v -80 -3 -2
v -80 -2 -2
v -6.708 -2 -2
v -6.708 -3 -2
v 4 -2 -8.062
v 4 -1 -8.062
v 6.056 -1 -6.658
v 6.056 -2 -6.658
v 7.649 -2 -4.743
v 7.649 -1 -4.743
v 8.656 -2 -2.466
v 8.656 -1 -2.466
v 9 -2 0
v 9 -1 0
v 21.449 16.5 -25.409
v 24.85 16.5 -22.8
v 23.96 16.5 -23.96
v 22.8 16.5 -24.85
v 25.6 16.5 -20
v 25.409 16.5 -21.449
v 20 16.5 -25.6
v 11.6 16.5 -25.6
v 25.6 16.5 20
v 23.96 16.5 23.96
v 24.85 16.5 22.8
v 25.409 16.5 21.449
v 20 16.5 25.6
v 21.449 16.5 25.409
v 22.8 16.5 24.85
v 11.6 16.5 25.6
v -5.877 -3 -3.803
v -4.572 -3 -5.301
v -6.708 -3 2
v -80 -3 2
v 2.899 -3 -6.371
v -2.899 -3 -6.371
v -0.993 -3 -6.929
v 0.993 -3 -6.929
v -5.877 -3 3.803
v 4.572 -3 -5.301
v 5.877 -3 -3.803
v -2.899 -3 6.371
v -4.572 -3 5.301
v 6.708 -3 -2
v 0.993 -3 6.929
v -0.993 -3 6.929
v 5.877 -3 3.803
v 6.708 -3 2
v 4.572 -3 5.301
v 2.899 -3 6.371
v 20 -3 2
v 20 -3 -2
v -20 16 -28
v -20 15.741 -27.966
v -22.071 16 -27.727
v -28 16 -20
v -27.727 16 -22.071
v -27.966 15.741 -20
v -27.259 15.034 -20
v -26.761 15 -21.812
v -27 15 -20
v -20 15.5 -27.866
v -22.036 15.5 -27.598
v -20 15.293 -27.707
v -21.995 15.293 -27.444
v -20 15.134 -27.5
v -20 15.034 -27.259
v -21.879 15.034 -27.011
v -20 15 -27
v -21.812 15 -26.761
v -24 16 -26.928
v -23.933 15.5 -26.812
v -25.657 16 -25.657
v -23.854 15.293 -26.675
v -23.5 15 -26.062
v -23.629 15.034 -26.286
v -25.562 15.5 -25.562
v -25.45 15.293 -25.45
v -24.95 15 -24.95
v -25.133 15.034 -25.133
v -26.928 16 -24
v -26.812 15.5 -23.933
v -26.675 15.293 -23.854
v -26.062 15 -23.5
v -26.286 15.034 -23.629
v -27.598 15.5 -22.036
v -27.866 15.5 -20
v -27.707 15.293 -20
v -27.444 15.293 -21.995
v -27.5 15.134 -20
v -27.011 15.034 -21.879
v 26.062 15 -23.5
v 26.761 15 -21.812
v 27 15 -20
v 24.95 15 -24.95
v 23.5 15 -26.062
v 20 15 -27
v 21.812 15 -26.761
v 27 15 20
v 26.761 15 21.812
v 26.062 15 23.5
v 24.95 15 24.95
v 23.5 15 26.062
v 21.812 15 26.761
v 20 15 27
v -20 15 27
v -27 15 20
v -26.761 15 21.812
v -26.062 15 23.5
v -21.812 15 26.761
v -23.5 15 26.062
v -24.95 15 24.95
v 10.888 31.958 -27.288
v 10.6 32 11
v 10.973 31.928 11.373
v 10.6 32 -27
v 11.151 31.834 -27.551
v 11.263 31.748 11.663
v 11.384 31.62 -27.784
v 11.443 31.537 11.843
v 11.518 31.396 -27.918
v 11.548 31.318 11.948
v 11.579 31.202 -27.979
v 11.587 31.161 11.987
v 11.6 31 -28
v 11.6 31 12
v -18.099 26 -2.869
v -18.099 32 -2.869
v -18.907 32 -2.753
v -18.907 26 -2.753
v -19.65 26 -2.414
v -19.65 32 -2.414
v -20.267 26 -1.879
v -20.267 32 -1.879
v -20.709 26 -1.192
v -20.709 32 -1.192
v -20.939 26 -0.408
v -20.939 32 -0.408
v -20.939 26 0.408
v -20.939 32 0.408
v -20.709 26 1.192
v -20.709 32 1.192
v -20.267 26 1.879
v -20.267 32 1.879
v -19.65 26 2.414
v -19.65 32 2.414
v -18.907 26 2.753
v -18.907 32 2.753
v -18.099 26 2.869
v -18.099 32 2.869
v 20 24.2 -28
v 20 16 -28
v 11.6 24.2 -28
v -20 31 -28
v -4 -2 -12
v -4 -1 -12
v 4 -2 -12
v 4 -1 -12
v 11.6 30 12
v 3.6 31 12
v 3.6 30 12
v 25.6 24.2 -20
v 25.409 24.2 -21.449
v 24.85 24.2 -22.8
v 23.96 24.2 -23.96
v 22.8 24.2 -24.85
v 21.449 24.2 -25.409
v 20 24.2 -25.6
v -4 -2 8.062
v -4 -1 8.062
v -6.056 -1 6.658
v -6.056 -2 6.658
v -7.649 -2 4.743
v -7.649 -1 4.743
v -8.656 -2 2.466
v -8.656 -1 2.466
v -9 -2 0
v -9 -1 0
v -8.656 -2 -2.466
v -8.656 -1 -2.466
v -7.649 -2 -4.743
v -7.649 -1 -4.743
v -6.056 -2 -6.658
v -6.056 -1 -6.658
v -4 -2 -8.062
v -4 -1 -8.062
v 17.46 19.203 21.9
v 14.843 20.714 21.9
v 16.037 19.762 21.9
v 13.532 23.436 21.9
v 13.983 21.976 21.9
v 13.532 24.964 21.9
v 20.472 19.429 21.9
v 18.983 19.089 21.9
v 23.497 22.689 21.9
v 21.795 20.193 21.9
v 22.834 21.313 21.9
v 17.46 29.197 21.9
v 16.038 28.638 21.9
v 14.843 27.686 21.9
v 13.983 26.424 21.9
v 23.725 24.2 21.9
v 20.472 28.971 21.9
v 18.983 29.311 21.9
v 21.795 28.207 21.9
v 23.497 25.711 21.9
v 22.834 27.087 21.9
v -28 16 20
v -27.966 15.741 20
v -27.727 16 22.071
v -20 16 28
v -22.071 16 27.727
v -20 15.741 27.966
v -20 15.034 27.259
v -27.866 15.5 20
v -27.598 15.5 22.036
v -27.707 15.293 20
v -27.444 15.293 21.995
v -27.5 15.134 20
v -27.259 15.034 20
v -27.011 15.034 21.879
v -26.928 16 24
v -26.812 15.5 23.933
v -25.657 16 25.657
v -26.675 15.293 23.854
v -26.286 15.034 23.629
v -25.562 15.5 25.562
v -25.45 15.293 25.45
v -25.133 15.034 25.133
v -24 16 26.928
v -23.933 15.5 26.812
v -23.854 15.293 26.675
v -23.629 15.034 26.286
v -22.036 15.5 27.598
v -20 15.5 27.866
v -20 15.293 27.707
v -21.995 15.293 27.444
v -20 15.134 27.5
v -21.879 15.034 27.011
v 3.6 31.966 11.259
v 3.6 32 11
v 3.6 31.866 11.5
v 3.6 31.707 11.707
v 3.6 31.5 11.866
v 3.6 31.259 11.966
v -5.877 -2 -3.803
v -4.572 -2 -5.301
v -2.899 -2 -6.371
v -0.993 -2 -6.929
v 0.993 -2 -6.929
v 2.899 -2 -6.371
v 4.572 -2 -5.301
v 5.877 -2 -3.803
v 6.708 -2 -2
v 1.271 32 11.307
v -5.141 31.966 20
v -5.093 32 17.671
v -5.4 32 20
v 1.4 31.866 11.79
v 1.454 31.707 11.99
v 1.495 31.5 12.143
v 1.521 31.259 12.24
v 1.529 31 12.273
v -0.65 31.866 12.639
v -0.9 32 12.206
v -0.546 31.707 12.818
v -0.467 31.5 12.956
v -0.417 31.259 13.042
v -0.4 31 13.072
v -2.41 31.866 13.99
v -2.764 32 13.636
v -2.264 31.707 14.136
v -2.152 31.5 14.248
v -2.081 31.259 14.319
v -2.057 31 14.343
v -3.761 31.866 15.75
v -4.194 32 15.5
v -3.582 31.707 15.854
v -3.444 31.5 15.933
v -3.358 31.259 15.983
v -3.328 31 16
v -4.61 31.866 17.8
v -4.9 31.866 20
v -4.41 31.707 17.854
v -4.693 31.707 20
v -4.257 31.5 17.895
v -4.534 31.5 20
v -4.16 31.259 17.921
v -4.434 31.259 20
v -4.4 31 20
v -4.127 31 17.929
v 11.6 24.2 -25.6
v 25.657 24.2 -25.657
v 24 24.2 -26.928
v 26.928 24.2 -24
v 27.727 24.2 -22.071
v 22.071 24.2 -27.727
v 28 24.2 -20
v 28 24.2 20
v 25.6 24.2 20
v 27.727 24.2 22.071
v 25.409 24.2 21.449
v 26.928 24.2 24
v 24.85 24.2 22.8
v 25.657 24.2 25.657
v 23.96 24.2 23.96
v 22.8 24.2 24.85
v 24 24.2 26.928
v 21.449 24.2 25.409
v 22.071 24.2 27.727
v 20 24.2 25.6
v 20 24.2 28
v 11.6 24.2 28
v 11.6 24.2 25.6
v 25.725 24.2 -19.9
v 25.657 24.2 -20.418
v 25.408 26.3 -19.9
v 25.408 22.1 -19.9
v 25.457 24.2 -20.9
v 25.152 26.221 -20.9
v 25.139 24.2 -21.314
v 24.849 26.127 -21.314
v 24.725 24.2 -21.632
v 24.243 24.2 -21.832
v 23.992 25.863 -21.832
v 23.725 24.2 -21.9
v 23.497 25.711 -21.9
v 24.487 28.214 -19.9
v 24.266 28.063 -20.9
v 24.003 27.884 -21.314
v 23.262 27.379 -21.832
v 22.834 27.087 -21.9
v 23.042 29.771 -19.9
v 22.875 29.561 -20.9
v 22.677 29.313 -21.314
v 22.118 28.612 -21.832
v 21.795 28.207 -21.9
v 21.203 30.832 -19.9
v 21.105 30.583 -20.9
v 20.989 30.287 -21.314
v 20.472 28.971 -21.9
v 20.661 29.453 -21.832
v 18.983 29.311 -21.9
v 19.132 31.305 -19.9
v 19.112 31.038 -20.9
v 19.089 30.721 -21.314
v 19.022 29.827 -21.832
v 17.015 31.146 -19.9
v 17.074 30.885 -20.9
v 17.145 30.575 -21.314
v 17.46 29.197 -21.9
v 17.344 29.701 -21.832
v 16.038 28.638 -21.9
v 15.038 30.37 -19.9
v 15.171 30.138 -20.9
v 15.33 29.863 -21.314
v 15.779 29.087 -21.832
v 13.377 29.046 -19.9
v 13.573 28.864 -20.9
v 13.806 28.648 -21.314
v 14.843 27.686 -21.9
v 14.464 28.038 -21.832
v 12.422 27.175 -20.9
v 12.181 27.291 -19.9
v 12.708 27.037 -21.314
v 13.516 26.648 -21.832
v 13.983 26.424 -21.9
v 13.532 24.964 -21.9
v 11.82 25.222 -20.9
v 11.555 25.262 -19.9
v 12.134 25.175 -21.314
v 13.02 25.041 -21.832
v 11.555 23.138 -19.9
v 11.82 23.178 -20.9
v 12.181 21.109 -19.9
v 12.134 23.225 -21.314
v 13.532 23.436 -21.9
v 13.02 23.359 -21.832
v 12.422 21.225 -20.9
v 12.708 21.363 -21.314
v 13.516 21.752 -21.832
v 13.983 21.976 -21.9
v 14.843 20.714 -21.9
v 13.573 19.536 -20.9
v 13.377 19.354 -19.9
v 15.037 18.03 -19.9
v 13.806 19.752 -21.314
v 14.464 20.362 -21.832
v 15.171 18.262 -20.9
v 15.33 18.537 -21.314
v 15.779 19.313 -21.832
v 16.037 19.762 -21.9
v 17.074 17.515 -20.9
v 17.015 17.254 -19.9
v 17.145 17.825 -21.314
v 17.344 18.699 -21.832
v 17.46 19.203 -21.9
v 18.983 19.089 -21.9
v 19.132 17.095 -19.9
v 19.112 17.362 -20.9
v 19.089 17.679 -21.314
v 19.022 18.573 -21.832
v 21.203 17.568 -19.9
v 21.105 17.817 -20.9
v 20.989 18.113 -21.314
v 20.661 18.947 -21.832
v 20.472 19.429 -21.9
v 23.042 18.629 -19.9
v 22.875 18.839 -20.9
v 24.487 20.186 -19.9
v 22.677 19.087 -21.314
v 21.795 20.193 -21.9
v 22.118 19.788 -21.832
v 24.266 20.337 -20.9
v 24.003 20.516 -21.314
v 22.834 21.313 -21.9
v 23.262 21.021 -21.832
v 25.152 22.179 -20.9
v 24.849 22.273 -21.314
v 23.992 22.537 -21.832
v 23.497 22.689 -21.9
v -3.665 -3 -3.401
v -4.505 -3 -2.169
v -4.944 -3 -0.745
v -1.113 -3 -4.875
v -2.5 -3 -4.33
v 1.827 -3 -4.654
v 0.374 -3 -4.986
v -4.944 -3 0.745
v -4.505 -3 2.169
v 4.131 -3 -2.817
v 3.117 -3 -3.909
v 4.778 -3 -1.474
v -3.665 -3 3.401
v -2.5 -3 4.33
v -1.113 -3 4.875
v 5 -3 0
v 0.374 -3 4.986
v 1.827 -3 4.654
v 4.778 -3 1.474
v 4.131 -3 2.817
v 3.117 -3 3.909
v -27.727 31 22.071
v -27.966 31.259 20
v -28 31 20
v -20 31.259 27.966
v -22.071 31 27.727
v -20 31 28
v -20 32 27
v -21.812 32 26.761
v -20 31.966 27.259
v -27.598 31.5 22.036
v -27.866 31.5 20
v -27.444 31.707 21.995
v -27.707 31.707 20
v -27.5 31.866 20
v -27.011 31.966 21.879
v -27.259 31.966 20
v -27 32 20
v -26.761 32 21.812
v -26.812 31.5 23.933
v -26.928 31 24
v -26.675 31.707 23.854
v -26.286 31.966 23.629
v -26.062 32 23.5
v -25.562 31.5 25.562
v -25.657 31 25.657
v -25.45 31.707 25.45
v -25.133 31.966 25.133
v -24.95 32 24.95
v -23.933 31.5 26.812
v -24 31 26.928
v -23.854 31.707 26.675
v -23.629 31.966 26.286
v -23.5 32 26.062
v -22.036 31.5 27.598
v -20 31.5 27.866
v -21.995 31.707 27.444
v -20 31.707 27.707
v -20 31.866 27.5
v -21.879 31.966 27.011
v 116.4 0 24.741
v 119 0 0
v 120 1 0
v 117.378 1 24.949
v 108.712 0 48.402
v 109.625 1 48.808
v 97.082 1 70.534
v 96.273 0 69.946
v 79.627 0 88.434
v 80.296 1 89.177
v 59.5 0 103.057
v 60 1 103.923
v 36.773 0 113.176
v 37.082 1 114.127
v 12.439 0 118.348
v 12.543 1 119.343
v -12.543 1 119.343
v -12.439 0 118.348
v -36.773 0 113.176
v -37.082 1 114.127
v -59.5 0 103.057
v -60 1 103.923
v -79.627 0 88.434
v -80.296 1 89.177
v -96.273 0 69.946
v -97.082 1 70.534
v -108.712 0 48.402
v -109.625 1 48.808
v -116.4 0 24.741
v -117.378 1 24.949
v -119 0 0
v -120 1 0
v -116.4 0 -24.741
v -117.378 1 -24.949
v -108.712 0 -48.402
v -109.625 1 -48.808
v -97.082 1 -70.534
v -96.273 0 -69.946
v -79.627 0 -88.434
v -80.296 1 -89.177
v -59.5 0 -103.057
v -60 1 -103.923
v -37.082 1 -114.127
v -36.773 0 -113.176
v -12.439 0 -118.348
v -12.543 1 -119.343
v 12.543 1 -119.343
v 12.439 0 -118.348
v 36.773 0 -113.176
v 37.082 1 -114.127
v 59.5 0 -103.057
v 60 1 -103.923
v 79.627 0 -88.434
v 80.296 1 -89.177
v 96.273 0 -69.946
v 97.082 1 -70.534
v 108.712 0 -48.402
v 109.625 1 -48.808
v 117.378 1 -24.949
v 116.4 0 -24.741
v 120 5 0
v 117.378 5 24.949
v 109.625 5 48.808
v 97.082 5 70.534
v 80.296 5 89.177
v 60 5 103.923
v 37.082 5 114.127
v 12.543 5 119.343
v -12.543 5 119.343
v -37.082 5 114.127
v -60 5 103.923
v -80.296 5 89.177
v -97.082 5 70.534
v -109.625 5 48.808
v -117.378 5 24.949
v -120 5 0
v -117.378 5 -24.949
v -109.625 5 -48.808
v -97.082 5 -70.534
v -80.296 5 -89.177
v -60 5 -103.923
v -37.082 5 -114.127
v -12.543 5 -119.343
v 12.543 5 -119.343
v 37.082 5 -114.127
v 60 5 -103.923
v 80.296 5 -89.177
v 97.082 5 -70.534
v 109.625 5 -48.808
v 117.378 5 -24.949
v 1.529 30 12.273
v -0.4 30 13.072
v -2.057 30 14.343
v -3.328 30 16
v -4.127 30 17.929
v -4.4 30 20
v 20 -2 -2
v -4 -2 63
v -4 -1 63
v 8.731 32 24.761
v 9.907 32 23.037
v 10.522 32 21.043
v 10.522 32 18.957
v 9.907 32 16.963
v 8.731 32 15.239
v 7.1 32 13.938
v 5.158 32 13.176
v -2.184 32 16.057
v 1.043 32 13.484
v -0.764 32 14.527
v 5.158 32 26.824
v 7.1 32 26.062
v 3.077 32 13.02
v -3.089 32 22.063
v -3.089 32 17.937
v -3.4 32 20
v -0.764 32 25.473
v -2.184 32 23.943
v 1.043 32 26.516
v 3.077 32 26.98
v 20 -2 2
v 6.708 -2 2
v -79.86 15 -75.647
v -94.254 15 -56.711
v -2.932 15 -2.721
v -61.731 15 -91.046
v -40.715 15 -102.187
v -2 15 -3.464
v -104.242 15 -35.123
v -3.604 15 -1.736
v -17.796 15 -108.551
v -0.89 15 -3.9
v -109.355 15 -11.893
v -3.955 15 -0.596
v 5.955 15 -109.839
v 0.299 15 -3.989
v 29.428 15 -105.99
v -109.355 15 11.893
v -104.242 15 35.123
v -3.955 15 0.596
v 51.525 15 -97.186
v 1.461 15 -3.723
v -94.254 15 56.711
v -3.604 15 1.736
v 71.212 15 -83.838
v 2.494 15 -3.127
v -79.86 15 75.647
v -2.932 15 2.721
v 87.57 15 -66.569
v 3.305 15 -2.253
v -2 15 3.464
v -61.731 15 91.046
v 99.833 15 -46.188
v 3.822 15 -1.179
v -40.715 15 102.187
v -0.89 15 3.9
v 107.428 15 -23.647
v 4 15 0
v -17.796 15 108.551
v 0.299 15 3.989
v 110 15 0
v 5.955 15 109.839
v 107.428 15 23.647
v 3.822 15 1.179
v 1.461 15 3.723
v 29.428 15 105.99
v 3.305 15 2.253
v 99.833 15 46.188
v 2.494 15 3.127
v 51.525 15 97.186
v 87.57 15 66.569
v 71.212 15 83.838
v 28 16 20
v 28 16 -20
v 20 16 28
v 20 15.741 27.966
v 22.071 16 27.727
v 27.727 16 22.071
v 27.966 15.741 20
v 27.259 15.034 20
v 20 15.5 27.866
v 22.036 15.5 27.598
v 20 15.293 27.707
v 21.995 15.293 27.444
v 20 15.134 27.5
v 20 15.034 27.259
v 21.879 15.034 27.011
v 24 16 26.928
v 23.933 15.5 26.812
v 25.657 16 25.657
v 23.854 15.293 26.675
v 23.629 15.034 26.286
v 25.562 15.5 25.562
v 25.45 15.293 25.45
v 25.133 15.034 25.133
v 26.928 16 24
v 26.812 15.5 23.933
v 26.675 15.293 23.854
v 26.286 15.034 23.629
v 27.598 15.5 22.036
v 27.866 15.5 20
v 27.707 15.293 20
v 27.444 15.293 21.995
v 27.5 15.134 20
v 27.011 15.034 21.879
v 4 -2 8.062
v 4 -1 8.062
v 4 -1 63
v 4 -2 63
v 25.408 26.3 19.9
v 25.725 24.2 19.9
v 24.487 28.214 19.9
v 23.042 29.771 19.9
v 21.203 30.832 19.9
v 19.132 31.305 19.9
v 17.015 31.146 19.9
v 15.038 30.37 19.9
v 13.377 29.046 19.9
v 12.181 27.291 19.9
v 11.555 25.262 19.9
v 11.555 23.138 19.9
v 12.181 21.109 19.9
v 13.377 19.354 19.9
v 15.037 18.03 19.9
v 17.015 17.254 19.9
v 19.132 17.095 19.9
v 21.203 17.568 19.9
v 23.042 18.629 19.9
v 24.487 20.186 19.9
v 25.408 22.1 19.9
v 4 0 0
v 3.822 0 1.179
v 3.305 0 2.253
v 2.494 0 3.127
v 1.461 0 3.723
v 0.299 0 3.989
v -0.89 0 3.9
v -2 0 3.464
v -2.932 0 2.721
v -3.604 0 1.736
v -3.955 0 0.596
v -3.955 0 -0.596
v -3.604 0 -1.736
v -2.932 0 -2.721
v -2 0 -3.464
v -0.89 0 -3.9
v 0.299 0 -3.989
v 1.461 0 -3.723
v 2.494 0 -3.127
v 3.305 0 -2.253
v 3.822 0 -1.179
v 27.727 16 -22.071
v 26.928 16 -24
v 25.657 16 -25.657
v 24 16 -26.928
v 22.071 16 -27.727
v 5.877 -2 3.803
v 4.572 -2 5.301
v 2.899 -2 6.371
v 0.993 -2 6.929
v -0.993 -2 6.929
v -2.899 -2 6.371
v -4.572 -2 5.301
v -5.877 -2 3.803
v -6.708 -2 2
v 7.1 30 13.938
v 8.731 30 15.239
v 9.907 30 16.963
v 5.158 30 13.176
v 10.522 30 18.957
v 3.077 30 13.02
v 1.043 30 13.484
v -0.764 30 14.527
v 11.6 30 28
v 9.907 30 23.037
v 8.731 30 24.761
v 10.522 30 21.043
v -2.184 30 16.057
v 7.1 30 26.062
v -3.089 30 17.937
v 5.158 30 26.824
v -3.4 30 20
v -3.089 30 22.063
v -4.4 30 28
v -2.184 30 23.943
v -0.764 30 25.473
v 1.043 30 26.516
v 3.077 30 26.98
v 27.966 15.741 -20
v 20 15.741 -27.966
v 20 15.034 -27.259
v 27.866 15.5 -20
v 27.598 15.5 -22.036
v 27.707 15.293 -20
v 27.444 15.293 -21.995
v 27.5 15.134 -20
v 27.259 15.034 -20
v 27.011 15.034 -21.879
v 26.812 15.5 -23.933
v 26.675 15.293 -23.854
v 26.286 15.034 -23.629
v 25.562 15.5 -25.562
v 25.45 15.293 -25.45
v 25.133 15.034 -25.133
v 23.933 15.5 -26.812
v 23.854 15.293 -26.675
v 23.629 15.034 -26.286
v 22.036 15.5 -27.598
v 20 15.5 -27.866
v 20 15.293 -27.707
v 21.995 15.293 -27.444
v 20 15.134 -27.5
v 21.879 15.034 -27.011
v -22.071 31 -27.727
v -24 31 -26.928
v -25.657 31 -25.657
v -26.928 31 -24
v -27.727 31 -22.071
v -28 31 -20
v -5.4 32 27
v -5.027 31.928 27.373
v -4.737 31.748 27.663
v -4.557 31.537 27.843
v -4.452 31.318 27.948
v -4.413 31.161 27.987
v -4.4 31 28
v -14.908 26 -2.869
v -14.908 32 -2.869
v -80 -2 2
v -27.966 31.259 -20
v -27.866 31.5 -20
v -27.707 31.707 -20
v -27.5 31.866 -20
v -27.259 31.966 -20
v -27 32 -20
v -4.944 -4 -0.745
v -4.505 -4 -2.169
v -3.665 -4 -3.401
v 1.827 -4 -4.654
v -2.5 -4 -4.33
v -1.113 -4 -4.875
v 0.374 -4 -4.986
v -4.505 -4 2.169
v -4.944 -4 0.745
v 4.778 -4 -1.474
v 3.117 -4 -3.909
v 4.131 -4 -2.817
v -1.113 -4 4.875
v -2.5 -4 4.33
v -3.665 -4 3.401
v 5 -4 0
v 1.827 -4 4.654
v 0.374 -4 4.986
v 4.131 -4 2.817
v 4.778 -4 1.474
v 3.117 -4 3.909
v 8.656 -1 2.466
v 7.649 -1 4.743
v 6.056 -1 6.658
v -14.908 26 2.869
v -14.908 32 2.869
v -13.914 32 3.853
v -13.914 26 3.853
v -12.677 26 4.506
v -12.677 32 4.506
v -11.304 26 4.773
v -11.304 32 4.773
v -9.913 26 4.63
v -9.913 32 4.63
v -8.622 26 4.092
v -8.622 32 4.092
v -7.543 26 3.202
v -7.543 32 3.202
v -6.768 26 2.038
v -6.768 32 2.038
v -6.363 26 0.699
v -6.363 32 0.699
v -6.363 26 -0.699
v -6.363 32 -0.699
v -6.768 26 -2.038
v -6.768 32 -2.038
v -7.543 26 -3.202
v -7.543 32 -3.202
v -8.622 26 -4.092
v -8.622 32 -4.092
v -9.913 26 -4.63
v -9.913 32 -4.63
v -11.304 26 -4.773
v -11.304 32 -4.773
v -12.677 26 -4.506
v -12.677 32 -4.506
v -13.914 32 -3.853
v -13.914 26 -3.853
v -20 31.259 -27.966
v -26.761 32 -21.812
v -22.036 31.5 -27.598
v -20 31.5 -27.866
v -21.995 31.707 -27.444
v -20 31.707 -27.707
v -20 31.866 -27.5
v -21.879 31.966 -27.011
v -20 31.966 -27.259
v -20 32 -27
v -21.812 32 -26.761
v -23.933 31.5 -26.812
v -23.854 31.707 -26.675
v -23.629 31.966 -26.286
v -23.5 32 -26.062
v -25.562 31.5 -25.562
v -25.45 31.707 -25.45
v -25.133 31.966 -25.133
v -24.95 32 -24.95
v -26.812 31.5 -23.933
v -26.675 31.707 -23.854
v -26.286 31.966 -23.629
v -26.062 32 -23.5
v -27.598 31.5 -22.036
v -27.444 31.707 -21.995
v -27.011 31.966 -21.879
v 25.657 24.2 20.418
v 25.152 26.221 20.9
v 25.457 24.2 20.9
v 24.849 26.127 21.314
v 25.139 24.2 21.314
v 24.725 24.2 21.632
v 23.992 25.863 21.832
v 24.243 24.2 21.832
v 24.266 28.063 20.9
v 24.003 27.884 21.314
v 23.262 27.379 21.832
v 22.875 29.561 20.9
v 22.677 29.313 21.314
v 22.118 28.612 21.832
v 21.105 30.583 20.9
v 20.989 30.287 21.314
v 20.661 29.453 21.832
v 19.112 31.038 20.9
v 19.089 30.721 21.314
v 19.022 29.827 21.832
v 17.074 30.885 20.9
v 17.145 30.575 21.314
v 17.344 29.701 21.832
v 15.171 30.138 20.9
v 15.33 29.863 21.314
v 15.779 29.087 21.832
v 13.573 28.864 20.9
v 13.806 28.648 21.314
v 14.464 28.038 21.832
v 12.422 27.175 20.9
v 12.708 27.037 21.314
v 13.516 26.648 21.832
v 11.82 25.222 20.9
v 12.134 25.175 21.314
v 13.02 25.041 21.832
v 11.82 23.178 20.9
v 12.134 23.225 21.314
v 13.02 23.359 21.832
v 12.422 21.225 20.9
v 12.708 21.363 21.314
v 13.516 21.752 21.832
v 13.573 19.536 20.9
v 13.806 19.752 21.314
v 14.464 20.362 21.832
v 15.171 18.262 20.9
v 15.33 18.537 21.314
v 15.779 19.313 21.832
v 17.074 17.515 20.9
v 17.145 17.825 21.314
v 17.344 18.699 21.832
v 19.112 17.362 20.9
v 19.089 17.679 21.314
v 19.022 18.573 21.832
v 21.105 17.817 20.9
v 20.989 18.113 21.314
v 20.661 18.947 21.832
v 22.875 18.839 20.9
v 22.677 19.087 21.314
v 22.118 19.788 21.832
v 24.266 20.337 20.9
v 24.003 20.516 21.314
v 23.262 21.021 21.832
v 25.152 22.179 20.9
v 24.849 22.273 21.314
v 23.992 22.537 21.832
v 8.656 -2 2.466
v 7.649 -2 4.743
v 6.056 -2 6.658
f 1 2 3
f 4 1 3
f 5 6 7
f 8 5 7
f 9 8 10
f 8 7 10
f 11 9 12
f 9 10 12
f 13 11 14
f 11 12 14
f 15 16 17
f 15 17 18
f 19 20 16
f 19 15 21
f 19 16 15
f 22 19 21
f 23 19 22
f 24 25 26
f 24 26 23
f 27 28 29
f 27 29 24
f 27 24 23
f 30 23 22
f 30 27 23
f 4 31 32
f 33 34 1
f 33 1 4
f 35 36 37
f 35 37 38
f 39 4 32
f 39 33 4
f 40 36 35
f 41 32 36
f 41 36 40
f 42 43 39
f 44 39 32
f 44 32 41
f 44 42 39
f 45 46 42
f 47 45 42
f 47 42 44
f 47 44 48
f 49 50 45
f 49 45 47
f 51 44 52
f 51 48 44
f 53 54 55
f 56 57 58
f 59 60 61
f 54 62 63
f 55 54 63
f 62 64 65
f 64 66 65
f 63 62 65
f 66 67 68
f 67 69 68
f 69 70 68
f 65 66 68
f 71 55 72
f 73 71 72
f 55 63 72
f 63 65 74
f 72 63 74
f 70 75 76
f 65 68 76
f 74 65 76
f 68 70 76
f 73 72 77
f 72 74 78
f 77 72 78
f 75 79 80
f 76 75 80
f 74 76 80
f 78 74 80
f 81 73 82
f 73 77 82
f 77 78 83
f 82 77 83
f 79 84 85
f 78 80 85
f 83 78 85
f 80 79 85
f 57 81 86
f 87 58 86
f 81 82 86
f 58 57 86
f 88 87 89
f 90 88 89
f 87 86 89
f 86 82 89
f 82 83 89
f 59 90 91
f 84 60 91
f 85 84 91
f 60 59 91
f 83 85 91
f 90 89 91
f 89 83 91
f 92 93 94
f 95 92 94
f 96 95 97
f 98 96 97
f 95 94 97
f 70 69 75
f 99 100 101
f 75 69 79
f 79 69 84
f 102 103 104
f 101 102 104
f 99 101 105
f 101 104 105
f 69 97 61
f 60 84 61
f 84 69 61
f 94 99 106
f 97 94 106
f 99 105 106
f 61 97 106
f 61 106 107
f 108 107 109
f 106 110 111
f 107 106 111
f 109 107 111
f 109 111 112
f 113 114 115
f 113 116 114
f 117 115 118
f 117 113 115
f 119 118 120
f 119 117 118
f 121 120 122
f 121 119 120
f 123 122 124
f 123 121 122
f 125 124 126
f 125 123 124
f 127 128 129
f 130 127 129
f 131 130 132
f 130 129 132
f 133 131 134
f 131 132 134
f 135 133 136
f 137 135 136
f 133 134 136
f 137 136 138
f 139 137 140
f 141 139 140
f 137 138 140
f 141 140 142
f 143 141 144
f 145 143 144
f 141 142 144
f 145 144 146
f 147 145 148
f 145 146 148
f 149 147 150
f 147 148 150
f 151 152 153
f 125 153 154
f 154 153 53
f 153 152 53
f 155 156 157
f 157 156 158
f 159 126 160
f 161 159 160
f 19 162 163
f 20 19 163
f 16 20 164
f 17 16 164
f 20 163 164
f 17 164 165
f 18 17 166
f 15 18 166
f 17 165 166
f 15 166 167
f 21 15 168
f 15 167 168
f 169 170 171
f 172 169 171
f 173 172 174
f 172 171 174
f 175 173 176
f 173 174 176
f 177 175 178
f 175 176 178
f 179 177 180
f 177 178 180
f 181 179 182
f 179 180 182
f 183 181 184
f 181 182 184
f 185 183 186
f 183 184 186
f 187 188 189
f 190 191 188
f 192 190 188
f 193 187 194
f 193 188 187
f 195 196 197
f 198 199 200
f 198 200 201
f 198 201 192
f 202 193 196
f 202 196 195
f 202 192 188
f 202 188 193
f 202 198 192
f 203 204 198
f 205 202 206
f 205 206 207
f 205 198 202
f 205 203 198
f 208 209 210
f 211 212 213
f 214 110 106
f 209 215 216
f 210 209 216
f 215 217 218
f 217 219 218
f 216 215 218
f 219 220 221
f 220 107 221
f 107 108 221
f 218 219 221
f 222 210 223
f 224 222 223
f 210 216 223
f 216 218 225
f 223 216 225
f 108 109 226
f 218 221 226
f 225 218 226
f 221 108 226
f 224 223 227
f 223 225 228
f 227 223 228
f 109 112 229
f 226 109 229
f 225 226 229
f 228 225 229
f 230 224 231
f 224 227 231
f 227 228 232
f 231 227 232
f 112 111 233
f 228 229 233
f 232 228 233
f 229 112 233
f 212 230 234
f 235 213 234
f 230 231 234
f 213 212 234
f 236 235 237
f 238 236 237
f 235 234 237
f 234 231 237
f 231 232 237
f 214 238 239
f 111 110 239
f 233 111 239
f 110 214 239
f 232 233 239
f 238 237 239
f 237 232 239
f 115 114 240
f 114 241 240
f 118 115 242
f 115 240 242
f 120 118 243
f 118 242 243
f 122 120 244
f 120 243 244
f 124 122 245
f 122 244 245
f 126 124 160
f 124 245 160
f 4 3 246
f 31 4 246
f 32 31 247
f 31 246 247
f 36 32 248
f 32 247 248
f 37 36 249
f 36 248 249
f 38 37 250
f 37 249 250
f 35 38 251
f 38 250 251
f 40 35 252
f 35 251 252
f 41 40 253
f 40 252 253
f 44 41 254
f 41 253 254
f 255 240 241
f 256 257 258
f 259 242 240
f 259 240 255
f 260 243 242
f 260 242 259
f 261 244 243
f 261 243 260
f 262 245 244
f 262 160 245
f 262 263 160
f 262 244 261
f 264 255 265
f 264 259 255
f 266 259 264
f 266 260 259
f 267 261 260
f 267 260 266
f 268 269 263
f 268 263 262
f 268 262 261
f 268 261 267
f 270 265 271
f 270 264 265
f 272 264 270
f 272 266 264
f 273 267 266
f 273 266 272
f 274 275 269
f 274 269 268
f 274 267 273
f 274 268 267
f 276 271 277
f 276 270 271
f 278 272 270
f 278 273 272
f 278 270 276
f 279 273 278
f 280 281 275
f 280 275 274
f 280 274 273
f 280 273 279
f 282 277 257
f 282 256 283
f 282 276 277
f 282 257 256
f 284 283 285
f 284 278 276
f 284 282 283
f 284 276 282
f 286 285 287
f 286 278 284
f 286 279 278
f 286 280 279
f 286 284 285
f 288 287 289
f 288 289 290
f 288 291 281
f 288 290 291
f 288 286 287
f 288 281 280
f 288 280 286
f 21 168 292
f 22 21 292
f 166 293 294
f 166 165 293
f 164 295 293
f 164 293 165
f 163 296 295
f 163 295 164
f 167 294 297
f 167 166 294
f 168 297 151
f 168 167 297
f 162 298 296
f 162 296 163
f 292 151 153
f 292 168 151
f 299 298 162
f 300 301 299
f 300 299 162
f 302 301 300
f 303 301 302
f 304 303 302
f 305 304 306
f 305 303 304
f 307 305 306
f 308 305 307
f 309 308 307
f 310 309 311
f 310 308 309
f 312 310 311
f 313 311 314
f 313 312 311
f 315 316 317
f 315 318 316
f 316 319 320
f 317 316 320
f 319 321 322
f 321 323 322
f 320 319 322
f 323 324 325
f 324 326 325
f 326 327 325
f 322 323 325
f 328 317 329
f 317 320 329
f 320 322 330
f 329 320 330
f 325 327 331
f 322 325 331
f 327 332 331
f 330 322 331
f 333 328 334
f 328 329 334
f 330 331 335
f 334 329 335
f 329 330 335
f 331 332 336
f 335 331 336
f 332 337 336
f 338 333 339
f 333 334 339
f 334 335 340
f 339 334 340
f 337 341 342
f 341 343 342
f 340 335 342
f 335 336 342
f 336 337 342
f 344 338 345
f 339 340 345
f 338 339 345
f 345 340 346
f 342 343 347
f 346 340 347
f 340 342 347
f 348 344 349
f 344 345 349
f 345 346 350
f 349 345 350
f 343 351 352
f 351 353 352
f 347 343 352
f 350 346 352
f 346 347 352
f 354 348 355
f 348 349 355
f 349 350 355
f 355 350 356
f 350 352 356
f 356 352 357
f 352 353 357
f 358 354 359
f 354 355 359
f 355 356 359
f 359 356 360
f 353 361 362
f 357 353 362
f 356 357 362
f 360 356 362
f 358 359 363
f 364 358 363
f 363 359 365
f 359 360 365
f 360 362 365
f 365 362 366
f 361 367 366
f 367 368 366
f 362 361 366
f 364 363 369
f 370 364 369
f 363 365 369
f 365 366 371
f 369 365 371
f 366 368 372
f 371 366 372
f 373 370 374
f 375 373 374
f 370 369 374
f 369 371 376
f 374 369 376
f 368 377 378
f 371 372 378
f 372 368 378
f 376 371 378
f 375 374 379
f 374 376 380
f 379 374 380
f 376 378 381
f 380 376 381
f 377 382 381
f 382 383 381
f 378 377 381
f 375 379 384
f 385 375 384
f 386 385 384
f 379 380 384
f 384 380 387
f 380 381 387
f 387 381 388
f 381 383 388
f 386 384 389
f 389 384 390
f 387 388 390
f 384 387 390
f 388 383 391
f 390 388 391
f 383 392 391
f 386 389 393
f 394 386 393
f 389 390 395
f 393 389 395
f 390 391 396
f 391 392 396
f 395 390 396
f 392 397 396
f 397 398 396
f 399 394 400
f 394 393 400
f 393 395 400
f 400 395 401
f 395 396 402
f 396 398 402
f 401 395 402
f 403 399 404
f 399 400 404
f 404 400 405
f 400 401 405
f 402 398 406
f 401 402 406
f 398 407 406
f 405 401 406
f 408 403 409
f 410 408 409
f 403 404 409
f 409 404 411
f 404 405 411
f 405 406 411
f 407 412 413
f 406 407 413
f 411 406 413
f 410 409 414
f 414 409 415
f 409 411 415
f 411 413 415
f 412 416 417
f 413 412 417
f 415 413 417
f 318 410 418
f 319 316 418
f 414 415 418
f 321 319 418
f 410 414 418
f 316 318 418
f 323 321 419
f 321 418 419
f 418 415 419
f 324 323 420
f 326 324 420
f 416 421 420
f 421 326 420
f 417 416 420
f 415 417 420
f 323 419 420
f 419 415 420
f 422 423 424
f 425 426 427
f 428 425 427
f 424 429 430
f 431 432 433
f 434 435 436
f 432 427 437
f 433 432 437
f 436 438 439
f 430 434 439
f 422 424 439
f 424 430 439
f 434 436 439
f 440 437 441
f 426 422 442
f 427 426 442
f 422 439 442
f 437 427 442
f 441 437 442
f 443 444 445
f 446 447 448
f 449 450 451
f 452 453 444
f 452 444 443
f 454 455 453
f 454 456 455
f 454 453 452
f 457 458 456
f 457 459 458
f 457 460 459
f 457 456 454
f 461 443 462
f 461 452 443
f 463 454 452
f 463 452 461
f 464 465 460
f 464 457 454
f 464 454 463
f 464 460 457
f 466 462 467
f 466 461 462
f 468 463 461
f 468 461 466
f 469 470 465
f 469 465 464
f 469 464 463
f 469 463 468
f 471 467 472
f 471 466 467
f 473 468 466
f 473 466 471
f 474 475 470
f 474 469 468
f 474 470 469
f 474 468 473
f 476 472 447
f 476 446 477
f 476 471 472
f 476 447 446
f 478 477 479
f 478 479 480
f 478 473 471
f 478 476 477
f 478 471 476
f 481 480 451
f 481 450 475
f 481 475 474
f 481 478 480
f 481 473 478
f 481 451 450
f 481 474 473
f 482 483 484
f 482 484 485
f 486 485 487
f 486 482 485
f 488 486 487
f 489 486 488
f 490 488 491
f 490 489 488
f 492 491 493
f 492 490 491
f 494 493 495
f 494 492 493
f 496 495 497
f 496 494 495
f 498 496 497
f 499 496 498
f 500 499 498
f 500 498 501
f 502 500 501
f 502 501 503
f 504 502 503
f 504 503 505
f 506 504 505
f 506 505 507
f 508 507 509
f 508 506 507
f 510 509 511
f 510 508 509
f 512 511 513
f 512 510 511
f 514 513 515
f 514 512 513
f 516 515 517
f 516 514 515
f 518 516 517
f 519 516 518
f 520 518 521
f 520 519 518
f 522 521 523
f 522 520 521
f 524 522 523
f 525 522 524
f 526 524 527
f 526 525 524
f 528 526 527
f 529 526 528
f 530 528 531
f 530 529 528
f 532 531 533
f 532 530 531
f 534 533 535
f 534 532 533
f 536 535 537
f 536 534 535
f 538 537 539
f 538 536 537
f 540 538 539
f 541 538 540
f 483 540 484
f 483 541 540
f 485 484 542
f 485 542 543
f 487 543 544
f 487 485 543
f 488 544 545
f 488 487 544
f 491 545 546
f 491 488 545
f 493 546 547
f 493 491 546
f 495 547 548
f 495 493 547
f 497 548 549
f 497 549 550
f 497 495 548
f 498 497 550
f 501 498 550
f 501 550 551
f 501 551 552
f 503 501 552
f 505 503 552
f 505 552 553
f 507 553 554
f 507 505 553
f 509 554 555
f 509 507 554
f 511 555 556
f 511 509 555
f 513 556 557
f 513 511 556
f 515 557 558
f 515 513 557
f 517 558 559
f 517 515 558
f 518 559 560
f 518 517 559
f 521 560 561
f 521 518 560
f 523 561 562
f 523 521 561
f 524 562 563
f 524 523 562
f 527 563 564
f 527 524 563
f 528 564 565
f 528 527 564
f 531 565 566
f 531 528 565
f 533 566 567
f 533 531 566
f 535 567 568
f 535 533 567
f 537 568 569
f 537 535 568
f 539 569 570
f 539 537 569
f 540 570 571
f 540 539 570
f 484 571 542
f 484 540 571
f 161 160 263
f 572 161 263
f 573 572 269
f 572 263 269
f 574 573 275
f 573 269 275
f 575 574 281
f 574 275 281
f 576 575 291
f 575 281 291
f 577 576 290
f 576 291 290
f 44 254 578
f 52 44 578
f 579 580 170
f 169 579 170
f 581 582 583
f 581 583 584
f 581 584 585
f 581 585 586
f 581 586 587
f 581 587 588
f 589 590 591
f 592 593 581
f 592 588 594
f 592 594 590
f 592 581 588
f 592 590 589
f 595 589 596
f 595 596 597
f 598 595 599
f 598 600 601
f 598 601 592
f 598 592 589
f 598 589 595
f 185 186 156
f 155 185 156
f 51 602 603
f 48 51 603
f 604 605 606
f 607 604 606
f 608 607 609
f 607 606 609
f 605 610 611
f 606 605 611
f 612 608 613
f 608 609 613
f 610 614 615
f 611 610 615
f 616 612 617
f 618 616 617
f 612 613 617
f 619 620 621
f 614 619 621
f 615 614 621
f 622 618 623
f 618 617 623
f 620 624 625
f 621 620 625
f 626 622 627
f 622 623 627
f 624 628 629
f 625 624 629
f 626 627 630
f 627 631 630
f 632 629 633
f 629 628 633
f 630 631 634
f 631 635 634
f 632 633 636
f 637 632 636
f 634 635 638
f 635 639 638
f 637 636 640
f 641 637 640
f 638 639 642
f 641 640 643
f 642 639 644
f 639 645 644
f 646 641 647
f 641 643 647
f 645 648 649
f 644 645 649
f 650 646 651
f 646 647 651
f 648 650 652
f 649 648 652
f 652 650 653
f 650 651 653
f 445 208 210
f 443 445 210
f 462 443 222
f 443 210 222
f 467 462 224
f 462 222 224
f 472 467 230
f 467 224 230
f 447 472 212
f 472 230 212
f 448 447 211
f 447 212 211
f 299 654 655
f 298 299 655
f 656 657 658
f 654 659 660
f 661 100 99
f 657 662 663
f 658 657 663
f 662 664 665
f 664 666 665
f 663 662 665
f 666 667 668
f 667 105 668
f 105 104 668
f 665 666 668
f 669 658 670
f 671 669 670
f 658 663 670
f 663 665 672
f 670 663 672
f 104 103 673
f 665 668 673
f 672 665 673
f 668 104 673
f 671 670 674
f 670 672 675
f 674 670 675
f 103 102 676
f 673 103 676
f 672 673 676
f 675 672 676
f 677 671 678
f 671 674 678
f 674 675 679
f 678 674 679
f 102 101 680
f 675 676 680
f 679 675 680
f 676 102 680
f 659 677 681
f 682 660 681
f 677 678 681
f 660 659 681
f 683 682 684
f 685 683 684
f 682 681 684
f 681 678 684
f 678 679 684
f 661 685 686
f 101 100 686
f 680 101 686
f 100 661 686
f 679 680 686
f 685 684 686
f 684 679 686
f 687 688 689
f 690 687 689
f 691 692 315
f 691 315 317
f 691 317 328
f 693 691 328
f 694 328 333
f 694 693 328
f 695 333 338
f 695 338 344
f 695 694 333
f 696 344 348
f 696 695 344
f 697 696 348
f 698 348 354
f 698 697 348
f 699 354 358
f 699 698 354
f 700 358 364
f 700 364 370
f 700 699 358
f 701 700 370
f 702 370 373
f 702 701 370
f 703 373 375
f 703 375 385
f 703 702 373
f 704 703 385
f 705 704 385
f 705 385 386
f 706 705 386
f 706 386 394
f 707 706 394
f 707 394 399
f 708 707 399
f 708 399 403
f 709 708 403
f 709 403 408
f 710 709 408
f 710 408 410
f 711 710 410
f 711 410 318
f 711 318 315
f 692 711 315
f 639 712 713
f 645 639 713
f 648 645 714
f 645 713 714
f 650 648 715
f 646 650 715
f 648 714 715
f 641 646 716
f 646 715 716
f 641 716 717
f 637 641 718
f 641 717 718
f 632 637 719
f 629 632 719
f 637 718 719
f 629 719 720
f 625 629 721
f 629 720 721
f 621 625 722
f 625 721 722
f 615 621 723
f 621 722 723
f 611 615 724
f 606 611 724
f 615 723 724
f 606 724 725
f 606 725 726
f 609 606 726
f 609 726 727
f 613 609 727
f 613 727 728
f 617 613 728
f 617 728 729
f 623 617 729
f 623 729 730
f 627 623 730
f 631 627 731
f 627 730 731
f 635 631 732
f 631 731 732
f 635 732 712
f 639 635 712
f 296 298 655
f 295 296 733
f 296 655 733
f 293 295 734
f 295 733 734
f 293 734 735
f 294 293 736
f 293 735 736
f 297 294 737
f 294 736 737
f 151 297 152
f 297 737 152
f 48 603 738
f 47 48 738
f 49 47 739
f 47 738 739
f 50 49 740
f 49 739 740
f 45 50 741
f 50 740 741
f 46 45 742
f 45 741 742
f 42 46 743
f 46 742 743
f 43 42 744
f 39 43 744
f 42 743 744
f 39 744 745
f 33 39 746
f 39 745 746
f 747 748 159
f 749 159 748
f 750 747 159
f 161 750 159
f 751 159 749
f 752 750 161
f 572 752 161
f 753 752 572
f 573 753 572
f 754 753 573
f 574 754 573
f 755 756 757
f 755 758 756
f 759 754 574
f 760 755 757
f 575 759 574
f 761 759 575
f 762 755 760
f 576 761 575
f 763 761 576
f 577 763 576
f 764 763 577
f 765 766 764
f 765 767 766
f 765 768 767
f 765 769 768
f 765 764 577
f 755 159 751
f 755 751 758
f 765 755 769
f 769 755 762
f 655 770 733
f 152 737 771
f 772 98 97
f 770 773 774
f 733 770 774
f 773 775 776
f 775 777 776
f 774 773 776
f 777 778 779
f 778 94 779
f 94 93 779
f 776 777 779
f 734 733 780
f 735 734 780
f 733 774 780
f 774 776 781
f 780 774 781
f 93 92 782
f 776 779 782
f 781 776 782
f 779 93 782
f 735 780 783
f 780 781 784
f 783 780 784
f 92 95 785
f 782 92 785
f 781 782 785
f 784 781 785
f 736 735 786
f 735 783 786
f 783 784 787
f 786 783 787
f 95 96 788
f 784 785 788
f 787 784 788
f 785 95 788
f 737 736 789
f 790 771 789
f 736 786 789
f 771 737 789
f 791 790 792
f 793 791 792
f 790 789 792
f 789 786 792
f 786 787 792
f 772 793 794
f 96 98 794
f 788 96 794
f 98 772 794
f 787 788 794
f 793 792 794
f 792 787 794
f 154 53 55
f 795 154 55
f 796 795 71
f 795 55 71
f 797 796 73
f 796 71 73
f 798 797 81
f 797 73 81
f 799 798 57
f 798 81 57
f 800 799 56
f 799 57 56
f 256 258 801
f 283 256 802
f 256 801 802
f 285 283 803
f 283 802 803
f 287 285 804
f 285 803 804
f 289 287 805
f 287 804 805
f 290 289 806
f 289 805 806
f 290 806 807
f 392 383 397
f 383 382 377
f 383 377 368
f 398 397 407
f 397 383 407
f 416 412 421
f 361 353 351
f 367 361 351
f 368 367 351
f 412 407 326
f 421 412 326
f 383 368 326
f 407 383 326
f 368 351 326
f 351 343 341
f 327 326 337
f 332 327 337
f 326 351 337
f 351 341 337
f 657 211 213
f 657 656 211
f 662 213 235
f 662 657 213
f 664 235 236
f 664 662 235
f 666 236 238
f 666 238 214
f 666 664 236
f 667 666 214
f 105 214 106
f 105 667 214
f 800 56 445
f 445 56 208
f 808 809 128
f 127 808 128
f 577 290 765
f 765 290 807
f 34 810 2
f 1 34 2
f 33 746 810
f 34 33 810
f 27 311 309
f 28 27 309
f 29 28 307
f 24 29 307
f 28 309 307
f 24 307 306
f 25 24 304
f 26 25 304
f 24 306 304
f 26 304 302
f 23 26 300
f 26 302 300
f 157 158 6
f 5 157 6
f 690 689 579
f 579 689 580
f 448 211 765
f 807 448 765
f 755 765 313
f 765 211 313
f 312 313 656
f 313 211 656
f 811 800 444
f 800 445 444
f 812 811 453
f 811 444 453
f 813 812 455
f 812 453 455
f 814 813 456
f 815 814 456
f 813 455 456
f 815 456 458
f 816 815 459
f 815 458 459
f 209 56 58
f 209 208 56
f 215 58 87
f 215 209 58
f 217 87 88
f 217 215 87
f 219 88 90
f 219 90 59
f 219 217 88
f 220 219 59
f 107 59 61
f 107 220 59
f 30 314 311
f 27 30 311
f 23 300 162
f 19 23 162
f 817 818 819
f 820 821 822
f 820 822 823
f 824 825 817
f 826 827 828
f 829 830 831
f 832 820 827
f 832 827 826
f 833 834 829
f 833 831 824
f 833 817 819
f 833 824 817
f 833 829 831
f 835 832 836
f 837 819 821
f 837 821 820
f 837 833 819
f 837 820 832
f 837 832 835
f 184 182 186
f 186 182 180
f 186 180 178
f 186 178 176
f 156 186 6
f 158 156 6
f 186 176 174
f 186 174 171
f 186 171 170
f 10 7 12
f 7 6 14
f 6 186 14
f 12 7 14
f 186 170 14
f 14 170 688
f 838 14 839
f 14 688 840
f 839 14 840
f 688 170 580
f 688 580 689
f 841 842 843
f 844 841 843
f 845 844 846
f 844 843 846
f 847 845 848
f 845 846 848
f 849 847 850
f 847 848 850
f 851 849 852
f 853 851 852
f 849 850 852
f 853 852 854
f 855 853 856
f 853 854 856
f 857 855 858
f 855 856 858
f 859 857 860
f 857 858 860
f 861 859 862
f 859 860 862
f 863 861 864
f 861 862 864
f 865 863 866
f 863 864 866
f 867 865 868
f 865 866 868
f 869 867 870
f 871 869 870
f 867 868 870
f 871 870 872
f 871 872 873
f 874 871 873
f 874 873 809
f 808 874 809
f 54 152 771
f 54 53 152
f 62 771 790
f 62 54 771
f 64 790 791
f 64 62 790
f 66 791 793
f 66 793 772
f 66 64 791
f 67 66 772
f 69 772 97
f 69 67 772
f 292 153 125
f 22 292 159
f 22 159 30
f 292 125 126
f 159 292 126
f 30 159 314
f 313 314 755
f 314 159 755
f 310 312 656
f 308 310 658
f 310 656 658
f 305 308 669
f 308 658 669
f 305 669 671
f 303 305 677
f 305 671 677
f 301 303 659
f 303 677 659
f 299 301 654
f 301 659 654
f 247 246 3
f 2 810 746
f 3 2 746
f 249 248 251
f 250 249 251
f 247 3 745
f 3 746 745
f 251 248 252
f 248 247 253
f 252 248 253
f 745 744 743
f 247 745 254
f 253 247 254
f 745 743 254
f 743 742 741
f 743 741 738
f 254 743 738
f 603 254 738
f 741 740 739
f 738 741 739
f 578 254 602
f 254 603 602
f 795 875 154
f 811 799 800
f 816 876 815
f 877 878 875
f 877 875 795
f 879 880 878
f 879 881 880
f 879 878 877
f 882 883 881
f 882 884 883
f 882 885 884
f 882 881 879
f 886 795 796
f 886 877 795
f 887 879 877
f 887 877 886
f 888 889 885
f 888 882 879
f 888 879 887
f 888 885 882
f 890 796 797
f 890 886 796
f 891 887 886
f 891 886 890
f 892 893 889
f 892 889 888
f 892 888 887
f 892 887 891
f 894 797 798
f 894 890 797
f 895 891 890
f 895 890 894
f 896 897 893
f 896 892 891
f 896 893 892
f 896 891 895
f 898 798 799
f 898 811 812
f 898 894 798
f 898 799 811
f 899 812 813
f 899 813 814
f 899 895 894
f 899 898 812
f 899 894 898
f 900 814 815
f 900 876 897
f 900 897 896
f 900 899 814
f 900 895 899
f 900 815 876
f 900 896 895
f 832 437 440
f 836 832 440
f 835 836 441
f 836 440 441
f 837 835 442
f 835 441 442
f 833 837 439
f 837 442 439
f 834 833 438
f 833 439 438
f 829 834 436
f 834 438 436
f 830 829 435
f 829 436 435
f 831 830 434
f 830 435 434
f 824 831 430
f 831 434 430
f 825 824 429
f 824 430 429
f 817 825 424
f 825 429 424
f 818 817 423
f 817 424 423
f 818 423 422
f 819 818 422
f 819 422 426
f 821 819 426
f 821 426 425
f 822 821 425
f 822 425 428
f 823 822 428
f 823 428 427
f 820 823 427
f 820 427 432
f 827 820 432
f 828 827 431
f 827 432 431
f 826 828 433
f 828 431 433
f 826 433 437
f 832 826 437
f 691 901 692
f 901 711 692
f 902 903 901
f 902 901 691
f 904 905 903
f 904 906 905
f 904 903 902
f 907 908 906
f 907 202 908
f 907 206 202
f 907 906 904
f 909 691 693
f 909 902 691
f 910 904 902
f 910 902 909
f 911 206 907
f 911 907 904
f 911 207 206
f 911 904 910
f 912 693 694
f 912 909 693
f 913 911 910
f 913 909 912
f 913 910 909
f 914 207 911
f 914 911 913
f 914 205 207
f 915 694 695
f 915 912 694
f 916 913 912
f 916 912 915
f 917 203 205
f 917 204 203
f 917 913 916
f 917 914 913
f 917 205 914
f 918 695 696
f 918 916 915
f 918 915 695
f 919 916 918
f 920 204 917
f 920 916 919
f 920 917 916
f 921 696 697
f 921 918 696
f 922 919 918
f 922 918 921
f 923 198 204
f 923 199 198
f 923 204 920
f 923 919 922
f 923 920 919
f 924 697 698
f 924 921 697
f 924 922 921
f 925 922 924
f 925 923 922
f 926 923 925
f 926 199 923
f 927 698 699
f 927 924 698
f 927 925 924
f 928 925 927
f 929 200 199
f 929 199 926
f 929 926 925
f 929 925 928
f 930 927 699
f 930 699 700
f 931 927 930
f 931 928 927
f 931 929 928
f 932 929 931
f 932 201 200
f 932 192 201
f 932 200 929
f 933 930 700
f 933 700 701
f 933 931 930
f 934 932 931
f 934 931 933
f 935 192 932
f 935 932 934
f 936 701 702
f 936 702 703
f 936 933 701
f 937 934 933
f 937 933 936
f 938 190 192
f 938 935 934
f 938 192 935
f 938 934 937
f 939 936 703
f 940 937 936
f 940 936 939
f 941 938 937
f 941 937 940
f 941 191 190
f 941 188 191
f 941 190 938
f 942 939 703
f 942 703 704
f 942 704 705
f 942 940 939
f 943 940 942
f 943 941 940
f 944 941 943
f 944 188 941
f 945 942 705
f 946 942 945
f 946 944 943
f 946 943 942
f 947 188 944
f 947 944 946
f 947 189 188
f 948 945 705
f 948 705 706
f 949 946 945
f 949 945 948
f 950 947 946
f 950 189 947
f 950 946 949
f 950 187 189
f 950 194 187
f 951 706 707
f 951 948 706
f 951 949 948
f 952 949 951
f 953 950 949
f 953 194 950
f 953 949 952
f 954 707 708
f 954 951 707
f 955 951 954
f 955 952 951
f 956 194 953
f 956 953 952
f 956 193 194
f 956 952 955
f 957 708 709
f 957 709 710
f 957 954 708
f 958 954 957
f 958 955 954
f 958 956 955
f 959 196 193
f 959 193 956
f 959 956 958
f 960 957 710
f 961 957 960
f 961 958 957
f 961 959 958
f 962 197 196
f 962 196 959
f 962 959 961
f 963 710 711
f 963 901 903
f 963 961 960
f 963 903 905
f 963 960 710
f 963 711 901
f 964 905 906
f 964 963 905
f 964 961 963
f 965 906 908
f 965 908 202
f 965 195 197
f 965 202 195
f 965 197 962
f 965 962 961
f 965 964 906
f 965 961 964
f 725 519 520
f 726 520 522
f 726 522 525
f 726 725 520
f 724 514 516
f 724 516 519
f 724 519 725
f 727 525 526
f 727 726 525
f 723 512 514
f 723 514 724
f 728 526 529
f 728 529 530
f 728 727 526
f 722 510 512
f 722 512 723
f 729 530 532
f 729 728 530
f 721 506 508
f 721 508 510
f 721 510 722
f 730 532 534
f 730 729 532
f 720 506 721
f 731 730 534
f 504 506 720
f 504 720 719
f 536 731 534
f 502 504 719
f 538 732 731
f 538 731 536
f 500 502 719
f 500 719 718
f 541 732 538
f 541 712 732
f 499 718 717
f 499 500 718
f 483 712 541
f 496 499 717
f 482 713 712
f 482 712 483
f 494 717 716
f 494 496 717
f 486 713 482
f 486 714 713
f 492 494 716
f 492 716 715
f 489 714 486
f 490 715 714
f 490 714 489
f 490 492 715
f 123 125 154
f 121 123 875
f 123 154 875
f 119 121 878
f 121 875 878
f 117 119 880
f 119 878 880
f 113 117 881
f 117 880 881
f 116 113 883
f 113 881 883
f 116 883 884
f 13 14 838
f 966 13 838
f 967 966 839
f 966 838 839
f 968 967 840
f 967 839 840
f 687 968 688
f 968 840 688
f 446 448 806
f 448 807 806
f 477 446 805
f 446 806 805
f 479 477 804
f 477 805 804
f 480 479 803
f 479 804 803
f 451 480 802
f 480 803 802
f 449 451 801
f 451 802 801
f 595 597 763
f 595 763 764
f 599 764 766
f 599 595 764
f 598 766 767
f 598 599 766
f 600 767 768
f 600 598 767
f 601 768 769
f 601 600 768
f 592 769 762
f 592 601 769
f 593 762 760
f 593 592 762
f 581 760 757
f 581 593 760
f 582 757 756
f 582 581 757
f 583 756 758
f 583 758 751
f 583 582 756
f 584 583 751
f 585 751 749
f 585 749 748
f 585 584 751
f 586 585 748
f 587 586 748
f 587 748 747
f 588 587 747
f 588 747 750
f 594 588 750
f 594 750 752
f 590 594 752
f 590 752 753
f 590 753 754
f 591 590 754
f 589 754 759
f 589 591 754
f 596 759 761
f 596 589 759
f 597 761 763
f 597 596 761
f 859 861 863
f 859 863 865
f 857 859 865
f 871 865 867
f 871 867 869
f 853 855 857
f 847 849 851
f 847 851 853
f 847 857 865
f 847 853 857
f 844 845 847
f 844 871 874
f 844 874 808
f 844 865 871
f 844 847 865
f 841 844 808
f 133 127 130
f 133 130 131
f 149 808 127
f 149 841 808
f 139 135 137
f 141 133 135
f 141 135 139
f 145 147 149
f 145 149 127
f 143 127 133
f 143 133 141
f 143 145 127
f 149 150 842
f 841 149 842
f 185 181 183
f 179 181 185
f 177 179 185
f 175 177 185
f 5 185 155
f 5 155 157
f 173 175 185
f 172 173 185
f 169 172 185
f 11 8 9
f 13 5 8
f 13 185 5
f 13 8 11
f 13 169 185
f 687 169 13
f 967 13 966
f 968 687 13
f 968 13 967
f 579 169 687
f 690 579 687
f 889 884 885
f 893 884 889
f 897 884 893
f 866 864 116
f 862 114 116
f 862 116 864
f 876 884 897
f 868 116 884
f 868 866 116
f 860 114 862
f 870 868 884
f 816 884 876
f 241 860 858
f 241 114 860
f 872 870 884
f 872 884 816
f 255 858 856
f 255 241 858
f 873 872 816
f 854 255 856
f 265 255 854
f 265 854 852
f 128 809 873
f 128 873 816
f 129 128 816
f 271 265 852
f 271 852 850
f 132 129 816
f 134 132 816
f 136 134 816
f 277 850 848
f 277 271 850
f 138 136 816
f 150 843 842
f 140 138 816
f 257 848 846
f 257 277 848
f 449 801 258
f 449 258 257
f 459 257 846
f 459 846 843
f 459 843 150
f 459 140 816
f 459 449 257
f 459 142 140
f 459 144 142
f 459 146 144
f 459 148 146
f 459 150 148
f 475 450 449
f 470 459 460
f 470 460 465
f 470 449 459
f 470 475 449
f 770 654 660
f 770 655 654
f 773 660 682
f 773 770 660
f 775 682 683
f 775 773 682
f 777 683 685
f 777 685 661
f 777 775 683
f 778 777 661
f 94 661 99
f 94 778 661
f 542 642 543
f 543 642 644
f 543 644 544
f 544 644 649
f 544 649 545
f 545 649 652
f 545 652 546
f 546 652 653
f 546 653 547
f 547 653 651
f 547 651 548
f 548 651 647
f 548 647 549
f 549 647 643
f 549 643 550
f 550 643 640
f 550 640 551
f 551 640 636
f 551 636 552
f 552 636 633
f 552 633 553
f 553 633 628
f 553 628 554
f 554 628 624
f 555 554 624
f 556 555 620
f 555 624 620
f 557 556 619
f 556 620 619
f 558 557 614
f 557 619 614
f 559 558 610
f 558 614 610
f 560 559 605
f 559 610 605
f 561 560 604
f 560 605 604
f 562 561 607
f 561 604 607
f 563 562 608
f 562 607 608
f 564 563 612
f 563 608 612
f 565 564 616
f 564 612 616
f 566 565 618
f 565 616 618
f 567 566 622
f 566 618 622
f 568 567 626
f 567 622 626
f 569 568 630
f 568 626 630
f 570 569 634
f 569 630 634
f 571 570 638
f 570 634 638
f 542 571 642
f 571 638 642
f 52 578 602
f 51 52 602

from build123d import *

# Parameters (mm, degrees)
F0_R      = 120
F1_DEPTH  = 15
F2_R      = 2.5
F3_DEPTH  = 15
F5_DEPTH  = 17
F7_DEPTH  = 15.5
F8_W      = 16.4
F8_H      = 56
F9_DEPTH  = 7.8
F10_R     = 7
F11_DEPTH = 2
F12_R     = 1
F13_R     = 7.125
F14_DEPTH = 21.9
F15_R     = 2
F16_R     = 4
F17_DEPTH = 15
F19_START = 1
F19_DEPTH = 1
F21_DEPTH = 1
F22_R     = 5
F23_DEPTH = 1
F24_SIZE  = 1
F25_SIZE  = 10
F27_DEPTH = 6


with BuildPart() as f1:
    # F0 (on Front) → F1 (new body)
    with BuildSketch(Plane.XZ):
        Circle(F0_R)
    extrude(amount=-F1_DEPTH)

    # F2 (on face) → F3 (cut, through all)
    with BuildSketch(Plane(origin=(0, 15, 0), x_dir=(-1, 0, 0), z_dir=(0, 1, 0))):
        Circle(F2_R)
    extrude(amount=-F3_DEPTH, mode=Mode.SUBTRACT)

    # F16 (on face) → F17 (cut, through all)
    with BuildSketch(Plane.XZ):
        Circle(F16_R)
    extrude(amount=-F17_DEPTH, mode=Mode.SUBTRACT)

    # F24
    f24_edges = [f1.edges().sort_by_distance(p)[0] for p in [
        (-120, 0, 0),
    ]]
    chamfer(f24_edges, length=F24_SIZE)

    # F25
    f25_edges = [f1.edges().sort_by_distance(p)[0] for p in [
        (-120, 15, 0),
    ]]
    chamfer(f25_edges, length=F25_SIZE)


with BuildPart() as f5:
    # F4 (on face) → F5 (new body)
    with BuildSketch(Plane(origin=(0, 15, 0), x_dir=(-1, 0, 0), z_dir=(0, 1, 0))):
        with BuildLine():
            ThreePointArc((-28, -20), (-25.6568542495, -25.6568542495), (-20, -28))
            Line((-20, -28), (20, -28))
            ThreePointArc((20, -28), (25.6568542495, -25.6568542495), (28, -20))
            Line((28, -20), (28, 20))
            ThreePointArc((28, 20), (25.6568542495, 25.6568542495), (20, 28))
            Line((20, 28), (-20, 28))
            ThreePointArc((-20, 28), (-25.6568542495, 25.6568542495), (-28, 20))
            Line((-28, 20), (-28, -20))
        make_face()
    extrude(amount=F5_DEPTH)

    # F6 (on face) → F7 (cut)
    with BuildSketch(Plane(origin=(0, 32, 0), x_dir=(-1, 0, 0), z_dir=(0, 1, 0))):
        with BuildLine():
            Line((-25.6, 20), (-25.6, -20))
            ThreePointArc((-25.6, -20), (-23.9597979746, -23.9597979746), (-20, -25.6))
            Line((-20, -25.6), (-11.6, -25.6))
            Line((-11.6, -25.6), (-11.6, 25.6))
            Line((-11.6, 25.6), (-20, 25.6))
            ThreePointArc((-20, 25.6), (-23.9597979746, 23.9597979746), (-25.6, 20))
        make_face()
    extrude(amount=-F7_DEPTH, mode=Mode.SUBTRACT)

    # F8 (on face) → F9 (cut)
    with BuildSketch(Plane(origin=(0, 32, 0), x_dir=(-1, 0, 0), z_dir=(0, 1, 0))):
        with Locations((-19.8, 0)):
            Rectangle(F8_W, F8_H)
    extrude(amount=-F9_DEPTH, mode=Mode.SUBTRACT)

    # F10 (on face) → F11 (cut)
    with BuildSketch(Plane(origin=(0, 32, 0), x_dir=(-1, 0, 0), z_dir=(0, 1, 0))):
        with BuildLine():
            Line((-11.6, 28), (-11.6, 12))
            Line((-11.6, 12), (-3.6, 12))
            ThreePointArc((-3.6, 12), (2.0568542495, 14.3431457505), (4.4, 20))
            Line((4.4, 20), (4.4, 28))
            Line((4.4, 28), (-11.6, 28))
        make_face()
        with Locations((-3.6, 20)):
            Circle(F10_R, mode=Mode.SUBTRACT)
    extrude(amount=-F11_DEPTH, mode=Mode.SUBTRACT)

    # F12
    f12_edges = [f5.edges().sort_by_distance(p)[0] for p in [
        (7.6, 32, 12),
        (-2.056854, 32, 14.343146),
        (-4.4, 32, 24),
        (-12.2, 32, 28),
        (-25.656854, 32, 25.656854),
        (-28, 32, 0),
        (-25.656854, 32, -25.656854),
        (-4.2, 32, -28),
        (11.6, 32, -8),
        (25.656854, 15, -25.656854),
        (0, 15, -28),
        (-25.656854, 15, -25.656854),
        (-28, 15, 0),
        (-25.656854, 15, 25.656854),
        (0, 15, 28),
        (25.656854, 15, 25.656854),
        (28, 15, 0),
    ]]
    fillet(f12_edges, radius=F12_R)

    # F26 (on face) → F27 (cut)
    with BuildSketch(Plane(origin=(0, 32, 0), x_dir=(-1, 0, 0), z_dir=(0, 1, 0))):
        with BuildLine():
            Line((14.908463777, -2.8692556116), (18.0987944834, -2.8692556116))
            ThreePointArc((18.0987944834, -2.8692556116), (20.968050095, 0), (18.0987944834, 2.8692556116))
            Line((18.0987944834, 2.8692556116), (14.908463777, 2.8692556116))
            ThreePointArc((14.908463777, 2.8692556116), (6.3112790491, 0), (14.908463777, -2.8692556116))
        make_face()
    extrude(amount=-F27_DEPTH, mode=Mode.SUBTRACT)


with BuildPart() as f14:
    # F13 (on Top) → F14 (new body, symmetric)
    with BuildSketch(Plane.XY):
        with Locations((18.6, 24.2)):
            Circle(F13_R)
    extrude(amount=F14_DEPTH, both=True)

    # F15
    f15_edges = [f14.edges().sort_by_distance(p)[0] for p in [
        (11.475, 24.2, -21.9),
        (11.475, 24.2, 21.9),
    ]]
    fillet(f15_edges, radius=F15_R)


with BuildPart() as f19:
    # F18 (on face) → F19 (new body)
    with BuildSketch(Plane.XZ.offset(F19_START)):
        with BuildLine():
            Line((-4, -8.0622577483), (-4, -8))
            Line((-4, -8), (-4, 8.0622577483))
            ThreePointArc((-4, 8.0622577483), (-9, 0), (-4, -8.0622577483))
        make_face()
        with BuildLine():
            Line((-4, 8.0622577483), (-4, -8))
            Line((-4, -8), (-4, -8.0622577483))
            ThreePointArc((-4, -8.0622577483), (0, -9), (4, -8.0622577483))
            Line((4, -8.0622577483), (4, -8))
            Line((4, -8), (4, 8.0622577483))
            ThreePointArc((4, 8.0622577483), (0, 9), (-4, 8.0622577483))
        make_face()
        with BuildLine():
            Line((-4, 59), (-4, 8.0622577483))
            ThreePointArc((-4, 8.0622577483), (0, 9), (4, 8.0622577483))
            Line((4, 8.0622577483), (4, 59))
            Line((4, 59), (4, 63))
            Line((4, 63), (-4, 63))
            Line((-4, 63), (-4, 59))
        make_face()
        with BuildLine():
            ThreePointArc((4, -8.0622577483), (0, -9), (-4, -8.0622577483))
            Line((-4, -8.0622577483), (-4, -12))
            Line((-4, -12), (4, -12))
            Line((4, -12), (4, -8.0622577483))
        make_face()
        with BuildLine():
            ThreePointArc((9, 0), (7.6485292704, 4.7434164903), (4, 8.0622577483))
            Line((4, 8.0622577483), (4, -8))
            Line((4, -8), (4, -8.0622577483))
            ThreePointArc((4, -8.0622577483), (7.6485292704, -4.7434164903), (9, 0))
        make_face()
    extrude(amount=F19_DEPTH)


with BuildPart() as f21:
    # F20 (on face) → F21 (new body)
    with BuildSketch(Plane.XZ.offset(2)):
        with BuildLine():
            ThreePointArc((6.7082039325, -2), (6.9266668581, -1.010587075), (7, 0))
            ThreePointArc((7, 0), (6.9266668581, 1.010587075), (6.7082039325, 2))
            Line((6.7082039325, 2), (-6.7082039325, 2))
            ThreePointArc((-6.7082039325, 2), (-7, 0), (-6.7082039325, -2))
            Line((-6.7082039325, -2), (6.7082039325, -2))
        make_face()
        with BuildLine():
            ThreePointArc((6.7082039325, 2), (6.9266668581, 1.010587075), (7, 0))
            ThreePointArc((7, 0), (6.9266668581, -1.010587075), (6.7082039325, -2))
            Line((6.7082039325, -2), (20, -2))
            Line((20, -2), (20, 2))
            Line((20, 2), (6.7082039325, 2))
        make_face()
        with BuildLine():
            Line((-6.7082039325, 2), (6.7082039325, 2))
            ThreePointArc((6.7082039325, 2), (0, 7), (-6.7082039325, 2))
        make_face()
        with BuildLine():
            ThreePointArc((-6.7082039325, -2), (0, -7), (6.7082039325, -2))
            Line((6.7082039325, -2), (-6.7082039325, -2))
        make_face()
        with BuildLine():
            ThreePointArc((-6.7082039325, -2), (-7, 0), (-6.7082039325, 2))
            Line((-6.7082039325, 2), (-80, 2))
            Line((-80, 2), (-80, -2))
            Line((-80, -2), (-6.7082039325, -2))
        make_face()
    extrude(amount=F21_DEPTH)


with BuildPart() as f23:
    # F22 (on face) → F23 (new body)
    with BuildSketch(Plane.XZ.offset(3)):
        Circle(F22_R)
    extrude(amount=F23_DEPTH)


solid = Compound([f1.part, f5.part, f14.part, f19.part, f21.part, f23.part])
